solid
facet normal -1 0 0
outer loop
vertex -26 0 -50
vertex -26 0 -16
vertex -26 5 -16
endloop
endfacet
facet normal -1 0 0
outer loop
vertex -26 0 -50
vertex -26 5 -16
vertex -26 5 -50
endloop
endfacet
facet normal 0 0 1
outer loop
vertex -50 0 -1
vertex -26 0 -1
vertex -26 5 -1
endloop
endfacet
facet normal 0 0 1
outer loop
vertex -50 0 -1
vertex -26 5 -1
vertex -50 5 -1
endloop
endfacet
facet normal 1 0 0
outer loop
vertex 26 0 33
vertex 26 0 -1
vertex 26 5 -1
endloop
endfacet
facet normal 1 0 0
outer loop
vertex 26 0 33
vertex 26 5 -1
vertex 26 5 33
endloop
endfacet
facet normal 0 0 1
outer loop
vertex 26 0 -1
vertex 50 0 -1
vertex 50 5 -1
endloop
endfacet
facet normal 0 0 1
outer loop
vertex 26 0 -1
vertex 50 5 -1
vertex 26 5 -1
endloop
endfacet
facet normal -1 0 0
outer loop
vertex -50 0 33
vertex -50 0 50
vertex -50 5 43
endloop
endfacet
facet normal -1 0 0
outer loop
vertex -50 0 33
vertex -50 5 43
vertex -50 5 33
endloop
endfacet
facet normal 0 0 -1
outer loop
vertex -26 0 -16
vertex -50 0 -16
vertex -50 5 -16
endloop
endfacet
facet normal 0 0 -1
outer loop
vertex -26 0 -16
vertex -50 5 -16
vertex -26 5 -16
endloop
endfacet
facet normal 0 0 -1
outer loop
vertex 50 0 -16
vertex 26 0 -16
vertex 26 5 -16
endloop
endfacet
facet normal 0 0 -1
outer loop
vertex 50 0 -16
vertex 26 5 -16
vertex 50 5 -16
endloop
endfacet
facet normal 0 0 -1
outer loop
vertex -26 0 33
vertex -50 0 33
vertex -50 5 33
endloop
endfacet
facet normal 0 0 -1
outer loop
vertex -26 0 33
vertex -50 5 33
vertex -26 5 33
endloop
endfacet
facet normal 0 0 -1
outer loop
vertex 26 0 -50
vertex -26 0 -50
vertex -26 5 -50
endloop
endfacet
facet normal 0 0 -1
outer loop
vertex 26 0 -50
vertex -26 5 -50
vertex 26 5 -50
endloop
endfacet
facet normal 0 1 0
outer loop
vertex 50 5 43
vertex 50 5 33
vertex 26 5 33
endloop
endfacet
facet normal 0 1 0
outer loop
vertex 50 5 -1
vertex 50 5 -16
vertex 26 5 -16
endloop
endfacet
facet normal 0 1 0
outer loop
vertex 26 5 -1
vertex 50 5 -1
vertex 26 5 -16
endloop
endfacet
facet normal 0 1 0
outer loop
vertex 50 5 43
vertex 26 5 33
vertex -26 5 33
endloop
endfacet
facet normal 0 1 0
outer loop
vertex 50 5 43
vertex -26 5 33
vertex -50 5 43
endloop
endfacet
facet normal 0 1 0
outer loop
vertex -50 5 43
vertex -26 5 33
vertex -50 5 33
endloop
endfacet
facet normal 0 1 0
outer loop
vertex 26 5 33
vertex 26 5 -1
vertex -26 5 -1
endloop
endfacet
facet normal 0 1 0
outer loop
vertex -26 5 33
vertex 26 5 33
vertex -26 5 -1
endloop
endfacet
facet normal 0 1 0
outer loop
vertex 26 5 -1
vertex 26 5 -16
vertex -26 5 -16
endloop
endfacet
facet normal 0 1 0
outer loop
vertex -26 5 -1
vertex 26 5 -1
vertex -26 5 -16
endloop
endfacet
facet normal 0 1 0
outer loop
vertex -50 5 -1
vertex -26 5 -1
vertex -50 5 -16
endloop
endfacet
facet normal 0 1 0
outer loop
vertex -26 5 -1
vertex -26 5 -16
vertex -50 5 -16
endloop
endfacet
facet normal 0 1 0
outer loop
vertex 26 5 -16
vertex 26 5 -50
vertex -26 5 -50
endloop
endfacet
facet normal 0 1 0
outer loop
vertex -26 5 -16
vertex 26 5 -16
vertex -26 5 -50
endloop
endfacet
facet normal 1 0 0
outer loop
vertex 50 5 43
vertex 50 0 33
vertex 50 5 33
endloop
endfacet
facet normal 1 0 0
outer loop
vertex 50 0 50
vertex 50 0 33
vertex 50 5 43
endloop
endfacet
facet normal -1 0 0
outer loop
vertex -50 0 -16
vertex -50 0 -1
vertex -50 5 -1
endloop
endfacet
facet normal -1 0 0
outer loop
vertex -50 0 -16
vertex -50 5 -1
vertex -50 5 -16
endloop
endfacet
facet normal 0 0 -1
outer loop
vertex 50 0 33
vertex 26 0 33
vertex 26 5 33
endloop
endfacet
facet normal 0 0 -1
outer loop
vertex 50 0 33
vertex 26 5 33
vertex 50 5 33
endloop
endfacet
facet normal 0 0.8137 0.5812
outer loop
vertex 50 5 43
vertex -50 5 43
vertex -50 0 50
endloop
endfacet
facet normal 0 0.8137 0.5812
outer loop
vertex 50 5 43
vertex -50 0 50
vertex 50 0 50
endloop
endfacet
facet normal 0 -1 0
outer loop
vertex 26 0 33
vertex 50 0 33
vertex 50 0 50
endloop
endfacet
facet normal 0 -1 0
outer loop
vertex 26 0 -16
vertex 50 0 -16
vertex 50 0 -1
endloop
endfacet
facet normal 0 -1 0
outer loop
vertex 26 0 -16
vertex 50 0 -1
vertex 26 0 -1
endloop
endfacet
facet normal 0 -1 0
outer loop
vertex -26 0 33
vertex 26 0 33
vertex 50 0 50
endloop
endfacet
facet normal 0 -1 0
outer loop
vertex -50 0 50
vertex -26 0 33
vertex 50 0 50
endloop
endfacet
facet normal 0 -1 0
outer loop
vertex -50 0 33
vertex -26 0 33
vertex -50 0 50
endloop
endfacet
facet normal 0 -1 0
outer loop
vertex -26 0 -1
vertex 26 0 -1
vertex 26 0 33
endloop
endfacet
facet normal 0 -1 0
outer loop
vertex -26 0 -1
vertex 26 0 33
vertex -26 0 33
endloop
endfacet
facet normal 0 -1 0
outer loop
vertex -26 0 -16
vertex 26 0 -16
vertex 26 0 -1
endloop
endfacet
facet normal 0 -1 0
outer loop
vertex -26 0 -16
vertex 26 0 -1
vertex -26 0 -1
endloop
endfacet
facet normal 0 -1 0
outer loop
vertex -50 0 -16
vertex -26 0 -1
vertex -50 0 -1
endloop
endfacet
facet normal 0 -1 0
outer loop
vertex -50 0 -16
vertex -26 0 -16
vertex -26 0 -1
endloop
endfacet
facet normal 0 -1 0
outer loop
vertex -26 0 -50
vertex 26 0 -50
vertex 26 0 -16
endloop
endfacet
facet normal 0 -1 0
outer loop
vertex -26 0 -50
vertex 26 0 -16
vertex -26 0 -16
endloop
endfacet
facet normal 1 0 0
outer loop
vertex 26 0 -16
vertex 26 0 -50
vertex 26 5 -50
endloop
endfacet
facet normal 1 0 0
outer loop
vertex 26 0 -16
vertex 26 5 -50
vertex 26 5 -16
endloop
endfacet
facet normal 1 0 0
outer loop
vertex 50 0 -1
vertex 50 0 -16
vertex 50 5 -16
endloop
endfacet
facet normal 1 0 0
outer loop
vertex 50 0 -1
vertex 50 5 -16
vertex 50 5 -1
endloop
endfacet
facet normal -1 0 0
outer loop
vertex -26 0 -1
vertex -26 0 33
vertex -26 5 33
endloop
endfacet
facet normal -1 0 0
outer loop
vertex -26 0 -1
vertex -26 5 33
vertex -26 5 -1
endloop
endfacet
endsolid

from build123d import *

# Parameters (mm, degrees)
SALIENTE_EXTRUIR1_DEPTH  = 5
CORTE_CUCHILLA_START     = 29.061909686
CORTE_CUCHILLA_OUTLINE_W = 100
CORTE_CUCHILLA_OUTLINE_H = 11
CORTE_CUCHILLA_DEPTH     = 4.938090314


with BuildPart() as part:
    # Croquis2 → Saliente-Extruir1 (new body)
    with BuildSketch(Plane(origin=(0, 0, 0), x_dir=(1, 0, 0), z_dir=(0, 1, 0))):
        Polygon((-50, 1), (-50, 16), (-26, 16), (-26, 50), (26, 50), (26, 16), (50, 16), (50, 1), (26, 1), (26, -33), (50, -33), (50, -50), (-50, -50), (-50, -33), (-26, -33), (-26, 1), align=None)
    extrude(amount=SALIENTE_EXTRUIR1_DEPTH)

    # Corte-Cuchilla: read off the stored shape, not the designer's step
    # Corte-Cuchilla outline → Corte-Cuchilla (cut)
    with BuildSketch(Plane(origin=(0, 0, 0), x_dir=(1, 0, 0), z_dir=(0, 0.8137334712067352, 0.5812381937190961)).offset(CORTE_CUCHILLA_START)):
        with Locations((0, -36.5)):
            Rectangle(CORTE_CUCHILLA_OUTLINE_W, CORTE_CUCHILLA_OUTLINE_H)
    extrude(amount=CORTE_CUCHILLA_DEPTH, mode=Mode.SUBTRACT)


solid = part.part
